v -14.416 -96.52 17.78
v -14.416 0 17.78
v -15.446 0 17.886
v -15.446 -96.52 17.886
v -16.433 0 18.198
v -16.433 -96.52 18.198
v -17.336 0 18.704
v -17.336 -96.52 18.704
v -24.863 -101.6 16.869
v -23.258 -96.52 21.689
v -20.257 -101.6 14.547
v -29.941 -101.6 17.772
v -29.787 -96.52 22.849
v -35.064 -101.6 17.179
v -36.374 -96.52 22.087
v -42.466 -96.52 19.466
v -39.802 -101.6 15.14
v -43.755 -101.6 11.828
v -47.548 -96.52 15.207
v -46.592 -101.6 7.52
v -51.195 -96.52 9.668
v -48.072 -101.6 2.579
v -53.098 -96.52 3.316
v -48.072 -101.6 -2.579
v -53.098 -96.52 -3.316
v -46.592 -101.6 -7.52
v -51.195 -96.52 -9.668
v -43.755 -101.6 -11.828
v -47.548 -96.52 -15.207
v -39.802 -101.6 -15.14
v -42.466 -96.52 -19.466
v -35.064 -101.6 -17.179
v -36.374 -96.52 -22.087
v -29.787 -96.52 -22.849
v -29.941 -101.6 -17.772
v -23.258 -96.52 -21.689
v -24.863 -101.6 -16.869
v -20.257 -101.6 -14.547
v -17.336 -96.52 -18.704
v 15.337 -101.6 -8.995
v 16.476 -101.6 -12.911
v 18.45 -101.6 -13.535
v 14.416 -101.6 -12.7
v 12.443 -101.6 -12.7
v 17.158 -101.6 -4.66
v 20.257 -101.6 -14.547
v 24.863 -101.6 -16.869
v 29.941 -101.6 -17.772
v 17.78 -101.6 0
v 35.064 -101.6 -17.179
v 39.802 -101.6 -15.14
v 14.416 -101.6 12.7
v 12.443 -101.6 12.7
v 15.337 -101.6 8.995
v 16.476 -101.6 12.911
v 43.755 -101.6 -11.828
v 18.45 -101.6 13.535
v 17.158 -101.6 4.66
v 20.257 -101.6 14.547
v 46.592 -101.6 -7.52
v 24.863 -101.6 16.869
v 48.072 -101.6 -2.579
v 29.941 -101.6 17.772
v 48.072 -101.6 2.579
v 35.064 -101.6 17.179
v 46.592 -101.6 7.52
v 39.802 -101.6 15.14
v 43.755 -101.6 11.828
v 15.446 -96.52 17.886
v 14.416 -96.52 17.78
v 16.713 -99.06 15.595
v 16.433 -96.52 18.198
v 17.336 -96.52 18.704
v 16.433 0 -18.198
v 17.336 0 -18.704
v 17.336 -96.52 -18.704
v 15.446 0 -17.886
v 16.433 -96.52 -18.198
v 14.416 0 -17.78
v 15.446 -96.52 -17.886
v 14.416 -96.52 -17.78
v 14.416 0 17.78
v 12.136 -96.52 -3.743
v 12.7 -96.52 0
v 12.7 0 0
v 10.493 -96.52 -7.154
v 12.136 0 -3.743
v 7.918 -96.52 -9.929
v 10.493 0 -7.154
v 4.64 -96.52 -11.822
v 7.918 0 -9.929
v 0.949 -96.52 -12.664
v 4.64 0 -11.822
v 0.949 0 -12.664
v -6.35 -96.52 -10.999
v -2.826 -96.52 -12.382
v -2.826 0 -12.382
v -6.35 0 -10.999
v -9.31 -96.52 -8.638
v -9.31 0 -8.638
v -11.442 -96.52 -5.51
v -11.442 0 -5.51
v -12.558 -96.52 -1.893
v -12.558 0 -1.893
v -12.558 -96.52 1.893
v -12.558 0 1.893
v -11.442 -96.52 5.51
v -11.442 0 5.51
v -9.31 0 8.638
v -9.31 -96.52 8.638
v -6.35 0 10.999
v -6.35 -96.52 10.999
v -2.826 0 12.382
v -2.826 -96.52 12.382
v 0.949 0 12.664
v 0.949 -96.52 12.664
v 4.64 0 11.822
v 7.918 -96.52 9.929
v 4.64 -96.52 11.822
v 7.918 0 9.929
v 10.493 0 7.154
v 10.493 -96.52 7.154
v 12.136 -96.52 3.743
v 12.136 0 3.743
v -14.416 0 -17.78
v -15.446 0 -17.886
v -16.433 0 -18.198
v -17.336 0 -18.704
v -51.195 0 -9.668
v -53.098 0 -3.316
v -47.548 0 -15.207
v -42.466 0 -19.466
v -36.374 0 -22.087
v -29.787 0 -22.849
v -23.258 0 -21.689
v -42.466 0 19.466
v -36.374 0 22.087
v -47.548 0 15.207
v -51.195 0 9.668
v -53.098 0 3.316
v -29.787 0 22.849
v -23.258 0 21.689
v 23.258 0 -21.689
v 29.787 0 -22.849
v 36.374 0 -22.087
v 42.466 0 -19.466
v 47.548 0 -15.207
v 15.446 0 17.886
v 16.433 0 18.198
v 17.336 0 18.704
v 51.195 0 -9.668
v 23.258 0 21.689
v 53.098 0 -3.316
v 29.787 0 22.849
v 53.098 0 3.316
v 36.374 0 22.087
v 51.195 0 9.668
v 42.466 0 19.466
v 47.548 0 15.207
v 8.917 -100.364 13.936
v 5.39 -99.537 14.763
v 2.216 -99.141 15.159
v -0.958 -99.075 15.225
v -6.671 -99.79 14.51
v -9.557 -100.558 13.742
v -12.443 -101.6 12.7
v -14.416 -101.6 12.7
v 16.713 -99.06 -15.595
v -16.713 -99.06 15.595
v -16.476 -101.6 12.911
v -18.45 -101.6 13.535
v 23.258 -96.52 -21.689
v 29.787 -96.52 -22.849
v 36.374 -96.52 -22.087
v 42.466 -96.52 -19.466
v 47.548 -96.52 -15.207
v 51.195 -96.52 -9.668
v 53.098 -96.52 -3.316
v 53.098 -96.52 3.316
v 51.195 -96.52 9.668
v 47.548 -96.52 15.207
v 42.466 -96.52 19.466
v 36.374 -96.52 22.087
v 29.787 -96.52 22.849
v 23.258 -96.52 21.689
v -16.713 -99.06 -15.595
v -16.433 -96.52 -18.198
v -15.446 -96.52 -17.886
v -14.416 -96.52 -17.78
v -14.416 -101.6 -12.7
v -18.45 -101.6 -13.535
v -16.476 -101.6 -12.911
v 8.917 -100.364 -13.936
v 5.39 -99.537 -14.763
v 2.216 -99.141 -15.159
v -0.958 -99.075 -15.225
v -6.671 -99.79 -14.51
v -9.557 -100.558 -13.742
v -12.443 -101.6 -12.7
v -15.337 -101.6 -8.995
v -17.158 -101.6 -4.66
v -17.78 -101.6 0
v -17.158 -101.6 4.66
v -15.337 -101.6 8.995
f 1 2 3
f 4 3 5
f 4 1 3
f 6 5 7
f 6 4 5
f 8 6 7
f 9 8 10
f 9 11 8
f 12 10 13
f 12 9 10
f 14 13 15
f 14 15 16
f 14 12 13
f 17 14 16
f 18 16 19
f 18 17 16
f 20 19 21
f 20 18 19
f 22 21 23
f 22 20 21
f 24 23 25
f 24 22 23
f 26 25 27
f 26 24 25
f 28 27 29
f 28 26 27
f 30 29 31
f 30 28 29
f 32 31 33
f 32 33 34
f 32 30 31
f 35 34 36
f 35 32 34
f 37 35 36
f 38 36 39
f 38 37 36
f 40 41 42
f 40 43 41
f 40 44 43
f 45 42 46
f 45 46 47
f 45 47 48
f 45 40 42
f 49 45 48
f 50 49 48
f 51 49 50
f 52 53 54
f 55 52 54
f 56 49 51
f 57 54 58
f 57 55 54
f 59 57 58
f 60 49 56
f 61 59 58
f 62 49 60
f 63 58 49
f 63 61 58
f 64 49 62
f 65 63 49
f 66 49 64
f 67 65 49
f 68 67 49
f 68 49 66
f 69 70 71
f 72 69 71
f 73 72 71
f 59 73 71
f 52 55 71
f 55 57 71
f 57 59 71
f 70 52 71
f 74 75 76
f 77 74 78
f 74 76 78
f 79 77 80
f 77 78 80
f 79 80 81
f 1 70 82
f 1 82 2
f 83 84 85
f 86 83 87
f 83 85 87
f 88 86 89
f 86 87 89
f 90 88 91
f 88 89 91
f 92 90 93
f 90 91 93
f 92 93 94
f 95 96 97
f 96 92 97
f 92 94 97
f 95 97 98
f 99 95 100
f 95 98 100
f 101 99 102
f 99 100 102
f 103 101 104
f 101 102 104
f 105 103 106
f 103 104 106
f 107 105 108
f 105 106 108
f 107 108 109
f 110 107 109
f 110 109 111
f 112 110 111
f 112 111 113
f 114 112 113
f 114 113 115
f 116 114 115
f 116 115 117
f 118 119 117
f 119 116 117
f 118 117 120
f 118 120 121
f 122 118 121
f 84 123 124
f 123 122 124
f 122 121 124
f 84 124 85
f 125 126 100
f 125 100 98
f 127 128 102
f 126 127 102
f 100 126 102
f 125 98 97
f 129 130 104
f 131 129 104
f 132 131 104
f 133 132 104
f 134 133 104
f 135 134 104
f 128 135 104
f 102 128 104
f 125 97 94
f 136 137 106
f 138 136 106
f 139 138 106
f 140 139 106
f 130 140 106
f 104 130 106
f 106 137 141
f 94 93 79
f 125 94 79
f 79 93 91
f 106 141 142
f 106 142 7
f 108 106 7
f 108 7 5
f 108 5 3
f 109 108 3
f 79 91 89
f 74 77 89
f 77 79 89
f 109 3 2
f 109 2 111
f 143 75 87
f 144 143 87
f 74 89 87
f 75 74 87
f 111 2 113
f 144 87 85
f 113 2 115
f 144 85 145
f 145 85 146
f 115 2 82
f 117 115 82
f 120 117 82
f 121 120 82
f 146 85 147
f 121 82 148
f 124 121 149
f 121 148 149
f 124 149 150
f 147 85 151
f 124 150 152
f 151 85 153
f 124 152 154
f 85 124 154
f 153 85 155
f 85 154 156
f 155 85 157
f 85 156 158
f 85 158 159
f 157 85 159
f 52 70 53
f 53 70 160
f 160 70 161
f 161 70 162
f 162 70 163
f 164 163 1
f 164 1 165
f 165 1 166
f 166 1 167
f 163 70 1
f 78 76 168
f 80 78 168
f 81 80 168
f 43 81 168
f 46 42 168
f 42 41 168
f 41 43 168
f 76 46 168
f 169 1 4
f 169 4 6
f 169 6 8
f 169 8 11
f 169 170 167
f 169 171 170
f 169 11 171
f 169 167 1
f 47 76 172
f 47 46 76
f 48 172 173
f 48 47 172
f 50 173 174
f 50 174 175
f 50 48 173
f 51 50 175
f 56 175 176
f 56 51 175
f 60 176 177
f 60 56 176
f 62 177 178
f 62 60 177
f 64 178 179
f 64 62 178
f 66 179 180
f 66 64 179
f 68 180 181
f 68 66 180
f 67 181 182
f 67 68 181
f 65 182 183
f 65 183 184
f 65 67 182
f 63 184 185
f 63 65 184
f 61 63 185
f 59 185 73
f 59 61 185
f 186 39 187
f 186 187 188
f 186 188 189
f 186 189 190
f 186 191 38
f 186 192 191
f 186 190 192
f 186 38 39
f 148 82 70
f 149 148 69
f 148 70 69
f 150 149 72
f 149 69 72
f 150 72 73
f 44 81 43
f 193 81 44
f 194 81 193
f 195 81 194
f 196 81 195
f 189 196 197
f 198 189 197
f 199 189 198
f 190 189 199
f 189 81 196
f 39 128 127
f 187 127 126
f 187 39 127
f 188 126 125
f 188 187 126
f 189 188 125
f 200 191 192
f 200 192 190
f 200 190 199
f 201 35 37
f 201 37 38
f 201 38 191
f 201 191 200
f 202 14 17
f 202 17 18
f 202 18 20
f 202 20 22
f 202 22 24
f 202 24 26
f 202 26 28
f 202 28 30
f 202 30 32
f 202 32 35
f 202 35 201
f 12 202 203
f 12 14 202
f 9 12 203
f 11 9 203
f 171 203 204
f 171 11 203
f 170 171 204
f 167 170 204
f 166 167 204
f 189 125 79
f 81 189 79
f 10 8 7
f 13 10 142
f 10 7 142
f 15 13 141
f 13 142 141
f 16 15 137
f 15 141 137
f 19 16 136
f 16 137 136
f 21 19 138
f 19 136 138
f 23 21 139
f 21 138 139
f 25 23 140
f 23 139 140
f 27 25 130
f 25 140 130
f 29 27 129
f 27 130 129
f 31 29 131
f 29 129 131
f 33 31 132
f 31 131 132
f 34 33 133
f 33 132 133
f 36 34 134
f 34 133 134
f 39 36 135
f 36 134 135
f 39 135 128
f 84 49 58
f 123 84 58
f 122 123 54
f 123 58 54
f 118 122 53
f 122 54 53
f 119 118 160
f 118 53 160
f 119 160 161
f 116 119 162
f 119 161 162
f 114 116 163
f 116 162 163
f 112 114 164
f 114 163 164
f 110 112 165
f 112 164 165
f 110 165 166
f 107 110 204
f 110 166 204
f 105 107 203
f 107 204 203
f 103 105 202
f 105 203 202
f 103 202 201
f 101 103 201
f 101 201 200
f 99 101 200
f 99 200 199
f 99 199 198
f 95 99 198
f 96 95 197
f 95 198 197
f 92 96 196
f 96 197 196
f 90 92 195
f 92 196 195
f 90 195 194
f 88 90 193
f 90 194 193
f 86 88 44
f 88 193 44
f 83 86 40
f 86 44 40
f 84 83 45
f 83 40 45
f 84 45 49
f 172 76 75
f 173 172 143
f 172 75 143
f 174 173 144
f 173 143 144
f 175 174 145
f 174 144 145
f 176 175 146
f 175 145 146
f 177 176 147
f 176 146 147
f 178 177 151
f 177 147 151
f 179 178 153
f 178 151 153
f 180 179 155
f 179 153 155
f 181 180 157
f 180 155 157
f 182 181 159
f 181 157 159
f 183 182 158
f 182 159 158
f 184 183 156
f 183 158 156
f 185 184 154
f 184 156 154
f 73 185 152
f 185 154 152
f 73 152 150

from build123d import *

# Parameters (mm, degrees)
F1_DEPTH     = 101.6
F2_R         = 5.08
F3_R         = 5.08
F4_T1_DEPTH  = 28.8312589727
F4_T4_ANGLE  = 250.1936024552
F4_T6_ANGLE  = 35.0968012276
F4_T8_ANGLE  = 35.0968012276
F4_T10_ANGLE = 35.0968012276
F4_T12_ANGLE = 35.0968012276
F4_T14_ANGLE = 250.1936024552


# Not quite as in the source:
# - a fillet or chamfer that OpenCascade refuses, or shapes differently, is made with other operations: its cross-section is extruded or revolved along the edge and cut away or added


with BuildPart() as f1:
    # F0 (on Front) → F1 (new body)
    with BuildSketch(Plane.XZ):
        with BuildLine():
            Line((16.1115902063, 17.78), (-16.1115902063, 17.78))
            ThreePointArc((-16.1115902063, 17.78), (-53.34, 0), (-16.1115902063, -17.78))
            Line((-16.1115902063, -17.78), (16.1115902063, -17.78))
            ThreePointArc((16.1115902063, -17.78), (53.34, 0), (16.1115902063, 17.78))
        make_face()
        with BuildLine():
            ThreePointArc((-12.7, 0), (0, 12.7), (12.7, 0))
            ThreePointArc((12.7, 0), (0, -12.7), (-12.7, 0))
        make_face(mode=Mode.SUBTRACT)
    extrude(amount=F1_DEPTH)

    # F2
    f2_edges = [f1.edges().sort_by_distance(p)[0] for p in [
        (-16.11159, -50.8, 17.78),
        (16.11159, -50.8, 17.78),
    ]]
    fillet(f2_edges, radius=F2_R)

    # F3
    f3_edges = [f1.edges().sort_by_distance(p)[0] for p in [
        (-16.11159, -50.8, -17.78),
        (16.11159, -50.8, -17.78),
    ]]
    fillet(f3_edges, radius=F3_R)

    # F4: chamfer of 5.08 on 9 edges, made by hand

    # F4_s2 → F4_t1 (cut)
    with BuildSketch(Plane.YZ.offset(-14.4156294863)):
        Polygon((-96.52, -17.78), (-101.6, -12.7), (-101.6, -17.78), align=None)
        Polygon((-96.52, 17.78), (-101.6, 12.7), (-101.6, 17.78), align=None)
    extrude(amount=F4_T1_DEPTH, mode=Mode.SUBTRACT)

    # F4_s3 → F4_t4 (revolve, cut)
    with BuildSketch(Plane(origin=(20.4039669421, 0, -14.3384464089), x_dir=(0, 1, 0), z_dir=(-0.8181818182, 0, 0.5749595746))):
        Polygon((-96.52, 5.3352321669), (-101.6, 0.2552321669), (-101.6, 5.3352321669), align=None)
    revolve(axis=Axis((30.48, -101.6, 0), (0, -1, 0)), revolution_arc=F4_T4_ANGLE, mode=Mode.SUBTRACT)

    # F4_s5 → F4_t6 (revolve, cut)
    with BuildSketch(Plane(origin=(20.4039669421, 0, -14.3384464089), x_dir=(0, 1, 0), z_dir=(0.8181818182, 0, -0.5749595746))):
        Polygon((-96.52, -5.3352321669), (-101.6, -0.2552321669), (-101.6, -5.3352321669), align=None)
    revolve(axis=Axis((14.4156294863, -101.6, -22.86), (0, -1, 0)), revolution_arc=F4_T6_ANGLE, mode=Mode.SUBTRACT)

    # F4_s7 → F4_t8 (revolve, cut)
    with BuildSketch(Plane.YZ.offset(14.4156294863)):
        Polygon((-96.52, 17.78), (-101.6, 12.7), (-101.6, 17.78), align=None)
    revolve(axis=Axis((14.4156294863, -101.6, 22.86), (0, -1, 0)), revolution_arc=F4_T8_ANGLE, mode=Mode.SUBTRACT)

    # F4_s9 → F4_t10 (revolve, cut)
    with BuildSketch(Plane(origin=(-20.4039669421, 0, -14.3384464089), x_dir=(0, 1, 0), z_dir=(-0.8181818182, 0, -0.5749595746))):
        Polygon((-96.52, 5.3352321669), (-101.6, 0.2552321669), (-101.6, 5.3352321669), align=None)
    revolve(axis=Axis((-14.4156294863, -101.6, -22.86), (0, 1, 0)), revolution_arc=F4_T10_ANGLE, mode=Mode.SUBTRACT)

    # F4_s11 → F4_t12 (revolve, cut)
    with BuildSketch(Plane.YZ.offset(-14.4156294863)):
        Polygon((-96.52, 17.78), (-101.6, 12.7), (-101.6, 17.78), align=None)
    revolve(axis=Axis((-14.4156294863, -101.6, 22.86), (0, 1, 0)), revolution_arc=F4_T12_ANGLE, mode=Mode.SUBTRACT)

    # F4_s13 → F4_t14 (revolve, cut)
    with BuildSketch(Plane(origin=(-20.4039669421, 0, 14.3384464089), x_dir=(0, 1, 0), z_dir=(0.8181818182, 0, -0.5749595746))):
        Polygon((-96.52, 5.3352321669), (-101.6, 0.2552321669), (-101.6, 5.3352321669), align=None)
    revolve(axis=Axis((-30.48, -101.6, 0), (0, -1, 0)), revolution_arc=F4_T14_ANGLE, mode=Mode.SUBTRACT)

    # F4_s15 → F4_t16 (revolve, cut)
    with BuildSketch(Plane.XY):
        Polygon((12.7, -96.52), (17.78, -101.6), (12.7, -101.6), align=None)
    revolve(axis=Axis((0, -101.6, 0), (0, -1, 0)), mode=Mode.SUBTRACT)


solid = f1.part
